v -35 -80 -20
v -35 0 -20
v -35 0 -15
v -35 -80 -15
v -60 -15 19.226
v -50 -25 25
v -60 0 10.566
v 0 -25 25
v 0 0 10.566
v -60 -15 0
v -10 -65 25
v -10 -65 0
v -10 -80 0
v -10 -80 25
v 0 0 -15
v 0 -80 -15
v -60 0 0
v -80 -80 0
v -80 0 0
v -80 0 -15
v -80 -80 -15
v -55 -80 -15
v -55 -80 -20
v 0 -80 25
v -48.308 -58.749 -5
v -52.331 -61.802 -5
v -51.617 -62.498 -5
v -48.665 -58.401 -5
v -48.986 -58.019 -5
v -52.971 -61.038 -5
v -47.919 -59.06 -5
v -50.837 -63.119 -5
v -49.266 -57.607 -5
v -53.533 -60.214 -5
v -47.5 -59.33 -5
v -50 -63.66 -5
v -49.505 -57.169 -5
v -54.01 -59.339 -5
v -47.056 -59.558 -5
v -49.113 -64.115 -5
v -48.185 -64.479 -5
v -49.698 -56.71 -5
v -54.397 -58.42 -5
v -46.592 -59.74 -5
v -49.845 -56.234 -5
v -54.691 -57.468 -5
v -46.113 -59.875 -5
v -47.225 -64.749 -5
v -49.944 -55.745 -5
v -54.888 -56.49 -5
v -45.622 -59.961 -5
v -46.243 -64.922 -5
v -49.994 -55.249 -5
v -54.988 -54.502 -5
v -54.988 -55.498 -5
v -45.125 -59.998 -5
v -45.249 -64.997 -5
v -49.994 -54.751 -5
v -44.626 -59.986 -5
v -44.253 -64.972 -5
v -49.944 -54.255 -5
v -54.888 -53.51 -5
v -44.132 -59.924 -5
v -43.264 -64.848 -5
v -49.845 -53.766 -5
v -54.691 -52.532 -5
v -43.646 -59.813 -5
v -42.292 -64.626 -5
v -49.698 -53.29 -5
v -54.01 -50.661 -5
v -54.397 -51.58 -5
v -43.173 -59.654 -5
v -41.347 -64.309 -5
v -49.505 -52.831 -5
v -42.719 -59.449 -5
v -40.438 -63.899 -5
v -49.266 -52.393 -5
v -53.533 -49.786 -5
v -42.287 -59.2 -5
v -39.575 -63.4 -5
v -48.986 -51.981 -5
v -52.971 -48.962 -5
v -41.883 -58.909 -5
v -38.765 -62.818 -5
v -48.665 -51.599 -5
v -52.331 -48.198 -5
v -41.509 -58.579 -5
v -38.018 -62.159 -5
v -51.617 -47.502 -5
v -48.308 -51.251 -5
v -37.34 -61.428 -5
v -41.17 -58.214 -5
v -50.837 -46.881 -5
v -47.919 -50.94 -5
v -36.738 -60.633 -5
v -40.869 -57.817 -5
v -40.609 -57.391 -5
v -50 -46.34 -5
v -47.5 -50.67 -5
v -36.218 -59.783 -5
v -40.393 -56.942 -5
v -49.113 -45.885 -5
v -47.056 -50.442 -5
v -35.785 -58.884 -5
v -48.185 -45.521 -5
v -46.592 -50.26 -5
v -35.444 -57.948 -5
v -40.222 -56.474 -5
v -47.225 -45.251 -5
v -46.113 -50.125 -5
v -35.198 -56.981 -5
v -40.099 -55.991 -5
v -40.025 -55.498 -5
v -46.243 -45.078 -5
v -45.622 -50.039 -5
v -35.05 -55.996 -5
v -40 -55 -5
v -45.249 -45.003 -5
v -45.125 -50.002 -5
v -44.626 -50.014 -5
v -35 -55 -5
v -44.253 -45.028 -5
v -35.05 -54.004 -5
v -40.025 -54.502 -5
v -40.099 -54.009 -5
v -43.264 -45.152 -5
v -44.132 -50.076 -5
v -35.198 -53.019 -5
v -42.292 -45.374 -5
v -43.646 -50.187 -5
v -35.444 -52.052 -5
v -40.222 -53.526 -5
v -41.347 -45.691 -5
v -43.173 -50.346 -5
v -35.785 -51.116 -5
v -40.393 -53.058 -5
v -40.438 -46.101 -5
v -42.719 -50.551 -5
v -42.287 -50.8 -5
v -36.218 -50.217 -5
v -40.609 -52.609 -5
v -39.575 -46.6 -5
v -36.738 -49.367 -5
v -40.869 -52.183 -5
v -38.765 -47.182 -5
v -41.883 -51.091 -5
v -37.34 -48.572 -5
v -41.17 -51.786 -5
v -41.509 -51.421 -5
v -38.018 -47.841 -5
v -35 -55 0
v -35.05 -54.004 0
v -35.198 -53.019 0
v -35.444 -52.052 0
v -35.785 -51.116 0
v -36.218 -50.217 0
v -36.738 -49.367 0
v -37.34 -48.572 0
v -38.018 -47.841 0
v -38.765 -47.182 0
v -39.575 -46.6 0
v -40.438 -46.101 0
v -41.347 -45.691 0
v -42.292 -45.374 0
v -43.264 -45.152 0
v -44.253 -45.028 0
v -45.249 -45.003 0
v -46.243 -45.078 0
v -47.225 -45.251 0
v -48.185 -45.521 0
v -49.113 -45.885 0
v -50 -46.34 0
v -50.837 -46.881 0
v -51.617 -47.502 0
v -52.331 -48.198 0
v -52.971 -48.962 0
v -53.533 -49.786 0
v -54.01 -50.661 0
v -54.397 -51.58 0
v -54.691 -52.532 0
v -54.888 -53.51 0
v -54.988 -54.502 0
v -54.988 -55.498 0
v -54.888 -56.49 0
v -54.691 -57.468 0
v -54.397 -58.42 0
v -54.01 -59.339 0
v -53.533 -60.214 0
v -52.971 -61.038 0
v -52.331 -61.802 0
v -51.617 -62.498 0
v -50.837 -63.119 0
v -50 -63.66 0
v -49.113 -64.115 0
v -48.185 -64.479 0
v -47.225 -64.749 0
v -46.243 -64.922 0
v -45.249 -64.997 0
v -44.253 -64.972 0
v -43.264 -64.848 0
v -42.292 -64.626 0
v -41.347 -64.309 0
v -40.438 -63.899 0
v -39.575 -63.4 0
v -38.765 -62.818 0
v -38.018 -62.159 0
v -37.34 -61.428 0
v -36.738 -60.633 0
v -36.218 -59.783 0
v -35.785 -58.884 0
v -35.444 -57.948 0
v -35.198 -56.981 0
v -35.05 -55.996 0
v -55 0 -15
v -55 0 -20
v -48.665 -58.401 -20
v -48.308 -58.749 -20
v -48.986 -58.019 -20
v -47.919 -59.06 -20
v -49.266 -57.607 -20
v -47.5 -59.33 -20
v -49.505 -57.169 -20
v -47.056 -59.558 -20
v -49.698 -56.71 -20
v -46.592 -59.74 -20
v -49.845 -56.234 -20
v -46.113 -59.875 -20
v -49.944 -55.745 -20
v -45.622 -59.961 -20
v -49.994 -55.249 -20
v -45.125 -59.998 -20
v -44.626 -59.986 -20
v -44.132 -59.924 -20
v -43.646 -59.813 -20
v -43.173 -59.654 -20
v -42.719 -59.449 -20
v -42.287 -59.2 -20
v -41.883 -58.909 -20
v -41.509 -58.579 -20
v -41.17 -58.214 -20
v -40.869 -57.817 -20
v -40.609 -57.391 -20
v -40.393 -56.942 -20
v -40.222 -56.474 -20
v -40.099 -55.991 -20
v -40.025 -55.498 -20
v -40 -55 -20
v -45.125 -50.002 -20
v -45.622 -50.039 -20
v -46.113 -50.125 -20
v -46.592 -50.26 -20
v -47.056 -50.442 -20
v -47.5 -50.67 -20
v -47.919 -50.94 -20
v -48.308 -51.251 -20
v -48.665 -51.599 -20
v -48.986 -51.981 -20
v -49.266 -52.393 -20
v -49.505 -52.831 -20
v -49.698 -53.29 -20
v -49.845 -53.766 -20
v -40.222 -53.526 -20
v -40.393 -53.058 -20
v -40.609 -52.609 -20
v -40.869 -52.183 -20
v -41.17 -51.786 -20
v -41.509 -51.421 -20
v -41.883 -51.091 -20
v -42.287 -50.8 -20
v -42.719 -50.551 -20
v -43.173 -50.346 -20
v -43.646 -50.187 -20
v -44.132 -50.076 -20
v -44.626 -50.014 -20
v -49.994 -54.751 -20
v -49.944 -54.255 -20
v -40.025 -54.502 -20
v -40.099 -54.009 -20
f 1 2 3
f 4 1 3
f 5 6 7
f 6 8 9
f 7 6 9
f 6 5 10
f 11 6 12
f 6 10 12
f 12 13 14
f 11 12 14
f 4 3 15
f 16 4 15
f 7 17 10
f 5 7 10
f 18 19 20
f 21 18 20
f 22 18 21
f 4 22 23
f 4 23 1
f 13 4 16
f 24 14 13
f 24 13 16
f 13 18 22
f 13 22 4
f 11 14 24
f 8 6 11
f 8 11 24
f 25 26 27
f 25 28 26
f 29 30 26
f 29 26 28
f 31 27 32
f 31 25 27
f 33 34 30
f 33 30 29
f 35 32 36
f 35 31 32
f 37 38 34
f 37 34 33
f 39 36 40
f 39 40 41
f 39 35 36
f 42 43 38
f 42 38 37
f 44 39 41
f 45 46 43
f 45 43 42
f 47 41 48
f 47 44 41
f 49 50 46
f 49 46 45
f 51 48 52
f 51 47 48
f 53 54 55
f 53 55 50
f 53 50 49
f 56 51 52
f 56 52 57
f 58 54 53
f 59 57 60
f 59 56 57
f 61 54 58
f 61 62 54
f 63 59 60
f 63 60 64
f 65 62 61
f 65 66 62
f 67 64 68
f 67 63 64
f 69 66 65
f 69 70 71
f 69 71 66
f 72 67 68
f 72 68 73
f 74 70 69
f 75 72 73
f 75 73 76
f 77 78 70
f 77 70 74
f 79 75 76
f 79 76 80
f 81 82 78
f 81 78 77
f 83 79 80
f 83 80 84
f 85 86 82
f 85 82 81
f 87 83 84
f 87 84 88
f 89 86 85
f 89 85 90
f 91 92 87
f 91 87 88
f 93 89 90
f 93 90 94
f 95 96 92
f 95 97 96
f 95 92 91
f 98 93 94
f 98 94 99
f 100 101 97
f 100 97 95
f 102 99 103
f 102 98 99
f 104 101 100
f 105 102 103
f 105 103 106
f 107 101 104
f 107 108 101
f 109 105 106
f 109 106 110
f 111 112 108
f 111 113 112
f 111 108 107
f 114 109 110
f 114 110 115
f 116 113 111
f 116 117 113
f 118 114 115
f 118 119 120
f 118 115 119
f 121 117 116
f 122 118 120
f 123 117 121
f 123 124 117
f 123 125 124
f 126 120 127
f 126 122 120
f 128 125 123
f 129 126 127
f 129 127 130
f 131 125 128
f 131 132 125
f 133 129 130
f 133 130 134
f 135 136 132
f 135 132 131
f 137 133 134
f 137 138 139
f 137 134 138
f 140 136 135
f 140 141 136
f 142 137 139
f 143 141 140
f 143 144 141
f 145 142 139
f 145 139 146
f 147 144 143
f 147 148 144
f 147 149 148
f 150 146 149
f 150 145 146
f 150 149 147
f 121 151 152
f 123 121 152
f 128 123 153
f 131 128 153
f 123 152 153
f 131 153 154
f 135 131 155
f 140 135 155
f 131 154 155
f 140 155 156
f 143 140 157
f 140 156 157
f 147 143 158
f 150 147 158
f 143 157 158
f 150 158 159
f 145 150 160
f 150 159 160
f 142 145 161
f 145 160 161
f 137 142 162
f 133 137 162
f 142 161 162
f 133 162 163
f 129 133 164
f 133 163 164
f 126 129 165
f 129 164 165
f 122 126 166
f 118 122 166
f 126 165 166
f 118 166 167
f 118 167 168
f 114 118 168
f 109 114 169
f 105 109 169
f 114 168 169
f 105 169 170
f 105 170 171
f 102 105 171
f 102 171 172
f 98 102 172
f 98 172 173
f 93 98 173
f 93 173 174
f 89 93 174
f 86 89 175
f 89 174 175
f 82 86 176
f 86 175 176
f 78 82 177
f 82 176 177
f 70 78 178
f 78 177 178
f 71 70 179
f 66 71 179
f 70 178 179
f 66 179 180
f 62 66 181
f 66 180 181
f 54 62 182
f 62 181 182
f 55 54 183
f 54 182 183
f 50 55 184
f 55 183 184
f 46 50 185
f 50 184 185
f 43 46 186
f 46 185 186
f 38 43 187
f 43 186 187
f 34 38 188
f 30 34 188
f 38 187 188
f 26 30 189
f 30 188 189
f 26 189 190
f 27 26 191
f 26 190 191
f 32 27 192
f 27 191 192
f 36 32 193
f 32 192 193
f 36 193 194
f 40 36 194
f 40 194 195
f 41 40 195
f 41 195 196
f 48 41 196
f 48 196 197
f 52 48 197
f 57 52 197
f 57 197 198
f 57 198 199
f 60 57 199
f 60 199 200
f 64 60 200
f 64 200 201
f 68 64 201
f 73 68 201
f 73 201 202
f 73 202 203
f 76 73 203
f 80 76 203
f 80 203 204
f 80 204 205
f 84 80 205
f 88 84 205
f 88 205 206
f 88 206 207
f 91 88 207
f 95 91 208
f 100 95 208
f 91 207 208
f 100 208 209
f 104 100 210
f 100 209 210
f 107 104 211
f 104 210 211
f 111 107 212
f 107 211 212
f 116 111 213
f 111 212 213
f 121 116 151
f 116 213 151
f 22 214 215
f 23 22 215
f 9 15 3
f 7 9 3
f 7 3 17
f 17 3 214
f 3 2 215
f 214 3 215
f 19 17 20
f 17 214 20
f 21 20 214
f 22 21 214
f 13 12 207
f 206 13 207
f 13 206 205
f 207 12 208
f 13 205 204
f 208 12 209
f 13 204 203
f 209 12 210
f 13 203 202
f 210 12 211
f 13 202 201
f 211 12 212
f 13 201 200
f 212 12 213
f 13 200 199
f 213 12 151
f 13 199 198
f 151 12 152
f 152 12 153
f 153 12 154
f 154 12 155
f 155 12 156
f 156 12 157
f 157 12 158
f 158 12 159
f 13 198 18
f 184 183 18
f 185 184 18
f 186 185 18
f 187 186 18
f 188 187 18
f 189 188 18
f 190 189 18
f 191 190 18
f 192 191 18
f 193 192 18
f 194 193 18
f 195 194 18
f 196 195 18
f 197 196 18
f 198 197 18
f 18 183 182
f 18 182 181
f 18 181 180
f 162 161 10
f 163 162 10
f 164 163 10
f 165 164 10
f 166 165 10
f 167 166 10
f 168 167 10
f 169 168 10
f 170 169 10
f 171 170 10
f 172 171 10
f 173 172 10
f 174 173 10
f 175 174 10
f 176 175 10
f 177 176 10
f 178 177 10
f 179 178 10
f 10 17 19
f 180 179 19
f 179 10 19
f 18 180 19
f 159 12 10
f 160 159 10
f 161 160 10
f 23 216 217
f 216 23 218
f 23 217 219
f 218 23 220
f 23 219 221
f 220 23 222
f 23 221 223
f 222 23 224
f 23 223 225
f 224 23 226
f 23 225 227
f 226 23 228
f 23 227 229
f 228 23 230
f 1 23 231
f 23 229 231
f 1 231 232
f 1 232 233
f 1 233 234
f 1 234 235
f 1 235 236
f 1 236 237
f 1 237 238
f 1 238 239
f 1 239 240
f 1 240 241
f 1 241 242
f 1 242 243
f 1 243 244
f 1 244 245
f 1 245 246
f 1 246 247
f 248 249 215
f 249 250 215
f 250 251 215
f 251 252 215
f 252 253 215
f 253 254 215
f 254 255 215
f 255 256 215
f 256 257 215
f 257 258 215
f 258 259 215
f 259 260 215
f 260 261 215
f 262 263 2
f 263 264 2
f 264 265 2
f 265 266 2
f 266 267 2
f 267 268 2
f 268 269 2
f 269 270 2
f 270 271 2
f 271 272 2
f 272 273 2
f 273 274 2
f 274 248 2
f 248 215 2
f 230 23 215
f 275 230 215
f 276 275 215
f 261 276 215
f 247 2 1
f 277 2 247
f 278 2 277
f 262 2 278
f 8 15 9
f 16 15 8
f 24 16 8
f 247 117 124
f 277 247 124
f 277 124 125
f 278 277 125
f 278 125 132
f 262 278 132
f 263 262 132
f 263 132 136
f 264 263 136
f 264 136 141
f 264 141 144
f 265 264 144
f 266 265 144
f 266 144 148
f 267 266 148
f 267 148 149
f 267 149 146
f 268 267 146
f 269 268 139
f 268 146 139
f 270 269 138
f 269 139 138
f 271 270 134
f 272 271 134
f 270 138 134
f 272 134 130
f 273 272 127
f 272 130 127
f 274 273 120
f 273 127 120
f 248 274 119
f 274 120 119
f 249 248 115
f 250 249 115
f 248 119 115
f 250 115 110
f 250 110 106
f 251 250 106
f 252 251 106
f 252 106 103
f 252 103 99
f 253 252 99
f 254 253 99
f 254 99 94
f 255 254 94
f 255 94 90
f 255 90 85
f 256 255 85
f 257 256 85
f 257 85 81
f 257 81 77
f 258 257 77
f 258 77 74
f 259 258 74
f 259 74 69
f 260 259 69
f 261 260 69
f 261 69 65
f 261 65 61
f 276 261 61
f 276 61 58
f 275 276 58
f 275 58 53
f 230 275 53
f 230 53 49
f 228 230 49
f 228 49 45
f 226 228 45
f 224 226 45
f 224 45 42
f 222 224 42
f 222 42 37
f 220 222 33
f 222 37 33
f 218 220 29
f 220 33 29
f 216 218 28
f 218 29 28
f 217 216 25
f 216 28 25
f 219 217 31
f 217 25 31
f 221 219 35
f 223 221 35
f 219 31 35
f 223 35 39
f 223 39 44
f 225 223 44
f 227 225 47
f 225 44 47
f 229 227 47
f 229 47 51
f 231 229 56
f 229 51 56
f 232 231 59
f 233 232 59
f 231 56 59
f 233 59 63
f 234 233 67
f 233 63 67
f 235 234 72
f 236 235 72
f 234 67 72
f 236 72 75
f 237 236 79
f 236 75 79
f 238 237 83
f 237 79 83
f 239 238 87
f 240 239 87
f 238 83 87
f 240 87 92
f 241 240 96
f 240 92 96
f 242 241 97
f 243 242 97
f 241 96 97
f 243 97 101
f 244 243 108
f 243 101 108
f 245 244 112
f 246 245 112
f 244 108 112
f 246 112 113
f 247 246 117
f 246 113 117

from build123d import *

# Parameters (mm, degrees)
F1_DEPTH  = 80
F2_W      = 10
F2_H      = 25
F3_DEPTH  = 80
F5_DEPTH  = 25
F7_DEPTH  = 25
F9_DEPTH  = 80.001
F10_R     = 10
F11_DEPTH = 5
F12_R     = 5
F13_DEPTH = 25


with BuildPart() as f1:
    # F0 (on Front) → F1 (new body)
    with BuildSketch(Plane.XZ):
        Polygon((0, -15), (0, 0), (-80, 0), (-80, -15), (-55, -15), (-55, -20), (-35, -20), (-35, -15), align=None)
    extrude(amount=F1_DEPTH)

    # F2 (on face) → F3 (join)
    with BuildSketch(Plane.XZ.offset(80)):
        with Locations((-5, 12.5)):
            Rectangle(F2_W, F2_H)
    extrude(amount=-F3_DEPTH)

    # F4 (on face) → F5 (join, through all)
    with BuildSketch(Plane.XY.offset(25)):
        Polygon((-50, -25), (-10, -65), (-10, -25), align=None)
    extrude(amount=-F5_DEPTH)

    # F6 (on face) → F7 (join)
    with BuildSketch(Plane.XY):
        Polygon((-60, -15), (-50, -25), (-10, -25), (-10, 0), (-60, 0), align=None)
    extrude(amount=F7_DEPTH)

    # F8 (on face) → F9 (cut, through all)
    with BuildSketch(Plane.YZ):
        Polygon((0, 10.566243), (0, 25), (-25, 25), align=None)
    extrude(amount=-F9_DEPTH, mode=Mode.SUBTRACT)

    # F10 (on face) → F11 (cut)
    with BuildSketch(Plane.XY):
        with Locations((-45, -55)):
            Circle(F10_R)
    extrude(amount=-F11_DEPTH, mode=Mode.SUBTRACT)

    # F12 (on face) → F13 (cut)
    with BuildSketch(Plane.XY.offset(-5)):
        with Locations((-45, -55)):
            Circle(F12_R)
    extrude(amount=-F13_DEPTH, mode=Mode.SUBTRACT)


solid = f1.part
